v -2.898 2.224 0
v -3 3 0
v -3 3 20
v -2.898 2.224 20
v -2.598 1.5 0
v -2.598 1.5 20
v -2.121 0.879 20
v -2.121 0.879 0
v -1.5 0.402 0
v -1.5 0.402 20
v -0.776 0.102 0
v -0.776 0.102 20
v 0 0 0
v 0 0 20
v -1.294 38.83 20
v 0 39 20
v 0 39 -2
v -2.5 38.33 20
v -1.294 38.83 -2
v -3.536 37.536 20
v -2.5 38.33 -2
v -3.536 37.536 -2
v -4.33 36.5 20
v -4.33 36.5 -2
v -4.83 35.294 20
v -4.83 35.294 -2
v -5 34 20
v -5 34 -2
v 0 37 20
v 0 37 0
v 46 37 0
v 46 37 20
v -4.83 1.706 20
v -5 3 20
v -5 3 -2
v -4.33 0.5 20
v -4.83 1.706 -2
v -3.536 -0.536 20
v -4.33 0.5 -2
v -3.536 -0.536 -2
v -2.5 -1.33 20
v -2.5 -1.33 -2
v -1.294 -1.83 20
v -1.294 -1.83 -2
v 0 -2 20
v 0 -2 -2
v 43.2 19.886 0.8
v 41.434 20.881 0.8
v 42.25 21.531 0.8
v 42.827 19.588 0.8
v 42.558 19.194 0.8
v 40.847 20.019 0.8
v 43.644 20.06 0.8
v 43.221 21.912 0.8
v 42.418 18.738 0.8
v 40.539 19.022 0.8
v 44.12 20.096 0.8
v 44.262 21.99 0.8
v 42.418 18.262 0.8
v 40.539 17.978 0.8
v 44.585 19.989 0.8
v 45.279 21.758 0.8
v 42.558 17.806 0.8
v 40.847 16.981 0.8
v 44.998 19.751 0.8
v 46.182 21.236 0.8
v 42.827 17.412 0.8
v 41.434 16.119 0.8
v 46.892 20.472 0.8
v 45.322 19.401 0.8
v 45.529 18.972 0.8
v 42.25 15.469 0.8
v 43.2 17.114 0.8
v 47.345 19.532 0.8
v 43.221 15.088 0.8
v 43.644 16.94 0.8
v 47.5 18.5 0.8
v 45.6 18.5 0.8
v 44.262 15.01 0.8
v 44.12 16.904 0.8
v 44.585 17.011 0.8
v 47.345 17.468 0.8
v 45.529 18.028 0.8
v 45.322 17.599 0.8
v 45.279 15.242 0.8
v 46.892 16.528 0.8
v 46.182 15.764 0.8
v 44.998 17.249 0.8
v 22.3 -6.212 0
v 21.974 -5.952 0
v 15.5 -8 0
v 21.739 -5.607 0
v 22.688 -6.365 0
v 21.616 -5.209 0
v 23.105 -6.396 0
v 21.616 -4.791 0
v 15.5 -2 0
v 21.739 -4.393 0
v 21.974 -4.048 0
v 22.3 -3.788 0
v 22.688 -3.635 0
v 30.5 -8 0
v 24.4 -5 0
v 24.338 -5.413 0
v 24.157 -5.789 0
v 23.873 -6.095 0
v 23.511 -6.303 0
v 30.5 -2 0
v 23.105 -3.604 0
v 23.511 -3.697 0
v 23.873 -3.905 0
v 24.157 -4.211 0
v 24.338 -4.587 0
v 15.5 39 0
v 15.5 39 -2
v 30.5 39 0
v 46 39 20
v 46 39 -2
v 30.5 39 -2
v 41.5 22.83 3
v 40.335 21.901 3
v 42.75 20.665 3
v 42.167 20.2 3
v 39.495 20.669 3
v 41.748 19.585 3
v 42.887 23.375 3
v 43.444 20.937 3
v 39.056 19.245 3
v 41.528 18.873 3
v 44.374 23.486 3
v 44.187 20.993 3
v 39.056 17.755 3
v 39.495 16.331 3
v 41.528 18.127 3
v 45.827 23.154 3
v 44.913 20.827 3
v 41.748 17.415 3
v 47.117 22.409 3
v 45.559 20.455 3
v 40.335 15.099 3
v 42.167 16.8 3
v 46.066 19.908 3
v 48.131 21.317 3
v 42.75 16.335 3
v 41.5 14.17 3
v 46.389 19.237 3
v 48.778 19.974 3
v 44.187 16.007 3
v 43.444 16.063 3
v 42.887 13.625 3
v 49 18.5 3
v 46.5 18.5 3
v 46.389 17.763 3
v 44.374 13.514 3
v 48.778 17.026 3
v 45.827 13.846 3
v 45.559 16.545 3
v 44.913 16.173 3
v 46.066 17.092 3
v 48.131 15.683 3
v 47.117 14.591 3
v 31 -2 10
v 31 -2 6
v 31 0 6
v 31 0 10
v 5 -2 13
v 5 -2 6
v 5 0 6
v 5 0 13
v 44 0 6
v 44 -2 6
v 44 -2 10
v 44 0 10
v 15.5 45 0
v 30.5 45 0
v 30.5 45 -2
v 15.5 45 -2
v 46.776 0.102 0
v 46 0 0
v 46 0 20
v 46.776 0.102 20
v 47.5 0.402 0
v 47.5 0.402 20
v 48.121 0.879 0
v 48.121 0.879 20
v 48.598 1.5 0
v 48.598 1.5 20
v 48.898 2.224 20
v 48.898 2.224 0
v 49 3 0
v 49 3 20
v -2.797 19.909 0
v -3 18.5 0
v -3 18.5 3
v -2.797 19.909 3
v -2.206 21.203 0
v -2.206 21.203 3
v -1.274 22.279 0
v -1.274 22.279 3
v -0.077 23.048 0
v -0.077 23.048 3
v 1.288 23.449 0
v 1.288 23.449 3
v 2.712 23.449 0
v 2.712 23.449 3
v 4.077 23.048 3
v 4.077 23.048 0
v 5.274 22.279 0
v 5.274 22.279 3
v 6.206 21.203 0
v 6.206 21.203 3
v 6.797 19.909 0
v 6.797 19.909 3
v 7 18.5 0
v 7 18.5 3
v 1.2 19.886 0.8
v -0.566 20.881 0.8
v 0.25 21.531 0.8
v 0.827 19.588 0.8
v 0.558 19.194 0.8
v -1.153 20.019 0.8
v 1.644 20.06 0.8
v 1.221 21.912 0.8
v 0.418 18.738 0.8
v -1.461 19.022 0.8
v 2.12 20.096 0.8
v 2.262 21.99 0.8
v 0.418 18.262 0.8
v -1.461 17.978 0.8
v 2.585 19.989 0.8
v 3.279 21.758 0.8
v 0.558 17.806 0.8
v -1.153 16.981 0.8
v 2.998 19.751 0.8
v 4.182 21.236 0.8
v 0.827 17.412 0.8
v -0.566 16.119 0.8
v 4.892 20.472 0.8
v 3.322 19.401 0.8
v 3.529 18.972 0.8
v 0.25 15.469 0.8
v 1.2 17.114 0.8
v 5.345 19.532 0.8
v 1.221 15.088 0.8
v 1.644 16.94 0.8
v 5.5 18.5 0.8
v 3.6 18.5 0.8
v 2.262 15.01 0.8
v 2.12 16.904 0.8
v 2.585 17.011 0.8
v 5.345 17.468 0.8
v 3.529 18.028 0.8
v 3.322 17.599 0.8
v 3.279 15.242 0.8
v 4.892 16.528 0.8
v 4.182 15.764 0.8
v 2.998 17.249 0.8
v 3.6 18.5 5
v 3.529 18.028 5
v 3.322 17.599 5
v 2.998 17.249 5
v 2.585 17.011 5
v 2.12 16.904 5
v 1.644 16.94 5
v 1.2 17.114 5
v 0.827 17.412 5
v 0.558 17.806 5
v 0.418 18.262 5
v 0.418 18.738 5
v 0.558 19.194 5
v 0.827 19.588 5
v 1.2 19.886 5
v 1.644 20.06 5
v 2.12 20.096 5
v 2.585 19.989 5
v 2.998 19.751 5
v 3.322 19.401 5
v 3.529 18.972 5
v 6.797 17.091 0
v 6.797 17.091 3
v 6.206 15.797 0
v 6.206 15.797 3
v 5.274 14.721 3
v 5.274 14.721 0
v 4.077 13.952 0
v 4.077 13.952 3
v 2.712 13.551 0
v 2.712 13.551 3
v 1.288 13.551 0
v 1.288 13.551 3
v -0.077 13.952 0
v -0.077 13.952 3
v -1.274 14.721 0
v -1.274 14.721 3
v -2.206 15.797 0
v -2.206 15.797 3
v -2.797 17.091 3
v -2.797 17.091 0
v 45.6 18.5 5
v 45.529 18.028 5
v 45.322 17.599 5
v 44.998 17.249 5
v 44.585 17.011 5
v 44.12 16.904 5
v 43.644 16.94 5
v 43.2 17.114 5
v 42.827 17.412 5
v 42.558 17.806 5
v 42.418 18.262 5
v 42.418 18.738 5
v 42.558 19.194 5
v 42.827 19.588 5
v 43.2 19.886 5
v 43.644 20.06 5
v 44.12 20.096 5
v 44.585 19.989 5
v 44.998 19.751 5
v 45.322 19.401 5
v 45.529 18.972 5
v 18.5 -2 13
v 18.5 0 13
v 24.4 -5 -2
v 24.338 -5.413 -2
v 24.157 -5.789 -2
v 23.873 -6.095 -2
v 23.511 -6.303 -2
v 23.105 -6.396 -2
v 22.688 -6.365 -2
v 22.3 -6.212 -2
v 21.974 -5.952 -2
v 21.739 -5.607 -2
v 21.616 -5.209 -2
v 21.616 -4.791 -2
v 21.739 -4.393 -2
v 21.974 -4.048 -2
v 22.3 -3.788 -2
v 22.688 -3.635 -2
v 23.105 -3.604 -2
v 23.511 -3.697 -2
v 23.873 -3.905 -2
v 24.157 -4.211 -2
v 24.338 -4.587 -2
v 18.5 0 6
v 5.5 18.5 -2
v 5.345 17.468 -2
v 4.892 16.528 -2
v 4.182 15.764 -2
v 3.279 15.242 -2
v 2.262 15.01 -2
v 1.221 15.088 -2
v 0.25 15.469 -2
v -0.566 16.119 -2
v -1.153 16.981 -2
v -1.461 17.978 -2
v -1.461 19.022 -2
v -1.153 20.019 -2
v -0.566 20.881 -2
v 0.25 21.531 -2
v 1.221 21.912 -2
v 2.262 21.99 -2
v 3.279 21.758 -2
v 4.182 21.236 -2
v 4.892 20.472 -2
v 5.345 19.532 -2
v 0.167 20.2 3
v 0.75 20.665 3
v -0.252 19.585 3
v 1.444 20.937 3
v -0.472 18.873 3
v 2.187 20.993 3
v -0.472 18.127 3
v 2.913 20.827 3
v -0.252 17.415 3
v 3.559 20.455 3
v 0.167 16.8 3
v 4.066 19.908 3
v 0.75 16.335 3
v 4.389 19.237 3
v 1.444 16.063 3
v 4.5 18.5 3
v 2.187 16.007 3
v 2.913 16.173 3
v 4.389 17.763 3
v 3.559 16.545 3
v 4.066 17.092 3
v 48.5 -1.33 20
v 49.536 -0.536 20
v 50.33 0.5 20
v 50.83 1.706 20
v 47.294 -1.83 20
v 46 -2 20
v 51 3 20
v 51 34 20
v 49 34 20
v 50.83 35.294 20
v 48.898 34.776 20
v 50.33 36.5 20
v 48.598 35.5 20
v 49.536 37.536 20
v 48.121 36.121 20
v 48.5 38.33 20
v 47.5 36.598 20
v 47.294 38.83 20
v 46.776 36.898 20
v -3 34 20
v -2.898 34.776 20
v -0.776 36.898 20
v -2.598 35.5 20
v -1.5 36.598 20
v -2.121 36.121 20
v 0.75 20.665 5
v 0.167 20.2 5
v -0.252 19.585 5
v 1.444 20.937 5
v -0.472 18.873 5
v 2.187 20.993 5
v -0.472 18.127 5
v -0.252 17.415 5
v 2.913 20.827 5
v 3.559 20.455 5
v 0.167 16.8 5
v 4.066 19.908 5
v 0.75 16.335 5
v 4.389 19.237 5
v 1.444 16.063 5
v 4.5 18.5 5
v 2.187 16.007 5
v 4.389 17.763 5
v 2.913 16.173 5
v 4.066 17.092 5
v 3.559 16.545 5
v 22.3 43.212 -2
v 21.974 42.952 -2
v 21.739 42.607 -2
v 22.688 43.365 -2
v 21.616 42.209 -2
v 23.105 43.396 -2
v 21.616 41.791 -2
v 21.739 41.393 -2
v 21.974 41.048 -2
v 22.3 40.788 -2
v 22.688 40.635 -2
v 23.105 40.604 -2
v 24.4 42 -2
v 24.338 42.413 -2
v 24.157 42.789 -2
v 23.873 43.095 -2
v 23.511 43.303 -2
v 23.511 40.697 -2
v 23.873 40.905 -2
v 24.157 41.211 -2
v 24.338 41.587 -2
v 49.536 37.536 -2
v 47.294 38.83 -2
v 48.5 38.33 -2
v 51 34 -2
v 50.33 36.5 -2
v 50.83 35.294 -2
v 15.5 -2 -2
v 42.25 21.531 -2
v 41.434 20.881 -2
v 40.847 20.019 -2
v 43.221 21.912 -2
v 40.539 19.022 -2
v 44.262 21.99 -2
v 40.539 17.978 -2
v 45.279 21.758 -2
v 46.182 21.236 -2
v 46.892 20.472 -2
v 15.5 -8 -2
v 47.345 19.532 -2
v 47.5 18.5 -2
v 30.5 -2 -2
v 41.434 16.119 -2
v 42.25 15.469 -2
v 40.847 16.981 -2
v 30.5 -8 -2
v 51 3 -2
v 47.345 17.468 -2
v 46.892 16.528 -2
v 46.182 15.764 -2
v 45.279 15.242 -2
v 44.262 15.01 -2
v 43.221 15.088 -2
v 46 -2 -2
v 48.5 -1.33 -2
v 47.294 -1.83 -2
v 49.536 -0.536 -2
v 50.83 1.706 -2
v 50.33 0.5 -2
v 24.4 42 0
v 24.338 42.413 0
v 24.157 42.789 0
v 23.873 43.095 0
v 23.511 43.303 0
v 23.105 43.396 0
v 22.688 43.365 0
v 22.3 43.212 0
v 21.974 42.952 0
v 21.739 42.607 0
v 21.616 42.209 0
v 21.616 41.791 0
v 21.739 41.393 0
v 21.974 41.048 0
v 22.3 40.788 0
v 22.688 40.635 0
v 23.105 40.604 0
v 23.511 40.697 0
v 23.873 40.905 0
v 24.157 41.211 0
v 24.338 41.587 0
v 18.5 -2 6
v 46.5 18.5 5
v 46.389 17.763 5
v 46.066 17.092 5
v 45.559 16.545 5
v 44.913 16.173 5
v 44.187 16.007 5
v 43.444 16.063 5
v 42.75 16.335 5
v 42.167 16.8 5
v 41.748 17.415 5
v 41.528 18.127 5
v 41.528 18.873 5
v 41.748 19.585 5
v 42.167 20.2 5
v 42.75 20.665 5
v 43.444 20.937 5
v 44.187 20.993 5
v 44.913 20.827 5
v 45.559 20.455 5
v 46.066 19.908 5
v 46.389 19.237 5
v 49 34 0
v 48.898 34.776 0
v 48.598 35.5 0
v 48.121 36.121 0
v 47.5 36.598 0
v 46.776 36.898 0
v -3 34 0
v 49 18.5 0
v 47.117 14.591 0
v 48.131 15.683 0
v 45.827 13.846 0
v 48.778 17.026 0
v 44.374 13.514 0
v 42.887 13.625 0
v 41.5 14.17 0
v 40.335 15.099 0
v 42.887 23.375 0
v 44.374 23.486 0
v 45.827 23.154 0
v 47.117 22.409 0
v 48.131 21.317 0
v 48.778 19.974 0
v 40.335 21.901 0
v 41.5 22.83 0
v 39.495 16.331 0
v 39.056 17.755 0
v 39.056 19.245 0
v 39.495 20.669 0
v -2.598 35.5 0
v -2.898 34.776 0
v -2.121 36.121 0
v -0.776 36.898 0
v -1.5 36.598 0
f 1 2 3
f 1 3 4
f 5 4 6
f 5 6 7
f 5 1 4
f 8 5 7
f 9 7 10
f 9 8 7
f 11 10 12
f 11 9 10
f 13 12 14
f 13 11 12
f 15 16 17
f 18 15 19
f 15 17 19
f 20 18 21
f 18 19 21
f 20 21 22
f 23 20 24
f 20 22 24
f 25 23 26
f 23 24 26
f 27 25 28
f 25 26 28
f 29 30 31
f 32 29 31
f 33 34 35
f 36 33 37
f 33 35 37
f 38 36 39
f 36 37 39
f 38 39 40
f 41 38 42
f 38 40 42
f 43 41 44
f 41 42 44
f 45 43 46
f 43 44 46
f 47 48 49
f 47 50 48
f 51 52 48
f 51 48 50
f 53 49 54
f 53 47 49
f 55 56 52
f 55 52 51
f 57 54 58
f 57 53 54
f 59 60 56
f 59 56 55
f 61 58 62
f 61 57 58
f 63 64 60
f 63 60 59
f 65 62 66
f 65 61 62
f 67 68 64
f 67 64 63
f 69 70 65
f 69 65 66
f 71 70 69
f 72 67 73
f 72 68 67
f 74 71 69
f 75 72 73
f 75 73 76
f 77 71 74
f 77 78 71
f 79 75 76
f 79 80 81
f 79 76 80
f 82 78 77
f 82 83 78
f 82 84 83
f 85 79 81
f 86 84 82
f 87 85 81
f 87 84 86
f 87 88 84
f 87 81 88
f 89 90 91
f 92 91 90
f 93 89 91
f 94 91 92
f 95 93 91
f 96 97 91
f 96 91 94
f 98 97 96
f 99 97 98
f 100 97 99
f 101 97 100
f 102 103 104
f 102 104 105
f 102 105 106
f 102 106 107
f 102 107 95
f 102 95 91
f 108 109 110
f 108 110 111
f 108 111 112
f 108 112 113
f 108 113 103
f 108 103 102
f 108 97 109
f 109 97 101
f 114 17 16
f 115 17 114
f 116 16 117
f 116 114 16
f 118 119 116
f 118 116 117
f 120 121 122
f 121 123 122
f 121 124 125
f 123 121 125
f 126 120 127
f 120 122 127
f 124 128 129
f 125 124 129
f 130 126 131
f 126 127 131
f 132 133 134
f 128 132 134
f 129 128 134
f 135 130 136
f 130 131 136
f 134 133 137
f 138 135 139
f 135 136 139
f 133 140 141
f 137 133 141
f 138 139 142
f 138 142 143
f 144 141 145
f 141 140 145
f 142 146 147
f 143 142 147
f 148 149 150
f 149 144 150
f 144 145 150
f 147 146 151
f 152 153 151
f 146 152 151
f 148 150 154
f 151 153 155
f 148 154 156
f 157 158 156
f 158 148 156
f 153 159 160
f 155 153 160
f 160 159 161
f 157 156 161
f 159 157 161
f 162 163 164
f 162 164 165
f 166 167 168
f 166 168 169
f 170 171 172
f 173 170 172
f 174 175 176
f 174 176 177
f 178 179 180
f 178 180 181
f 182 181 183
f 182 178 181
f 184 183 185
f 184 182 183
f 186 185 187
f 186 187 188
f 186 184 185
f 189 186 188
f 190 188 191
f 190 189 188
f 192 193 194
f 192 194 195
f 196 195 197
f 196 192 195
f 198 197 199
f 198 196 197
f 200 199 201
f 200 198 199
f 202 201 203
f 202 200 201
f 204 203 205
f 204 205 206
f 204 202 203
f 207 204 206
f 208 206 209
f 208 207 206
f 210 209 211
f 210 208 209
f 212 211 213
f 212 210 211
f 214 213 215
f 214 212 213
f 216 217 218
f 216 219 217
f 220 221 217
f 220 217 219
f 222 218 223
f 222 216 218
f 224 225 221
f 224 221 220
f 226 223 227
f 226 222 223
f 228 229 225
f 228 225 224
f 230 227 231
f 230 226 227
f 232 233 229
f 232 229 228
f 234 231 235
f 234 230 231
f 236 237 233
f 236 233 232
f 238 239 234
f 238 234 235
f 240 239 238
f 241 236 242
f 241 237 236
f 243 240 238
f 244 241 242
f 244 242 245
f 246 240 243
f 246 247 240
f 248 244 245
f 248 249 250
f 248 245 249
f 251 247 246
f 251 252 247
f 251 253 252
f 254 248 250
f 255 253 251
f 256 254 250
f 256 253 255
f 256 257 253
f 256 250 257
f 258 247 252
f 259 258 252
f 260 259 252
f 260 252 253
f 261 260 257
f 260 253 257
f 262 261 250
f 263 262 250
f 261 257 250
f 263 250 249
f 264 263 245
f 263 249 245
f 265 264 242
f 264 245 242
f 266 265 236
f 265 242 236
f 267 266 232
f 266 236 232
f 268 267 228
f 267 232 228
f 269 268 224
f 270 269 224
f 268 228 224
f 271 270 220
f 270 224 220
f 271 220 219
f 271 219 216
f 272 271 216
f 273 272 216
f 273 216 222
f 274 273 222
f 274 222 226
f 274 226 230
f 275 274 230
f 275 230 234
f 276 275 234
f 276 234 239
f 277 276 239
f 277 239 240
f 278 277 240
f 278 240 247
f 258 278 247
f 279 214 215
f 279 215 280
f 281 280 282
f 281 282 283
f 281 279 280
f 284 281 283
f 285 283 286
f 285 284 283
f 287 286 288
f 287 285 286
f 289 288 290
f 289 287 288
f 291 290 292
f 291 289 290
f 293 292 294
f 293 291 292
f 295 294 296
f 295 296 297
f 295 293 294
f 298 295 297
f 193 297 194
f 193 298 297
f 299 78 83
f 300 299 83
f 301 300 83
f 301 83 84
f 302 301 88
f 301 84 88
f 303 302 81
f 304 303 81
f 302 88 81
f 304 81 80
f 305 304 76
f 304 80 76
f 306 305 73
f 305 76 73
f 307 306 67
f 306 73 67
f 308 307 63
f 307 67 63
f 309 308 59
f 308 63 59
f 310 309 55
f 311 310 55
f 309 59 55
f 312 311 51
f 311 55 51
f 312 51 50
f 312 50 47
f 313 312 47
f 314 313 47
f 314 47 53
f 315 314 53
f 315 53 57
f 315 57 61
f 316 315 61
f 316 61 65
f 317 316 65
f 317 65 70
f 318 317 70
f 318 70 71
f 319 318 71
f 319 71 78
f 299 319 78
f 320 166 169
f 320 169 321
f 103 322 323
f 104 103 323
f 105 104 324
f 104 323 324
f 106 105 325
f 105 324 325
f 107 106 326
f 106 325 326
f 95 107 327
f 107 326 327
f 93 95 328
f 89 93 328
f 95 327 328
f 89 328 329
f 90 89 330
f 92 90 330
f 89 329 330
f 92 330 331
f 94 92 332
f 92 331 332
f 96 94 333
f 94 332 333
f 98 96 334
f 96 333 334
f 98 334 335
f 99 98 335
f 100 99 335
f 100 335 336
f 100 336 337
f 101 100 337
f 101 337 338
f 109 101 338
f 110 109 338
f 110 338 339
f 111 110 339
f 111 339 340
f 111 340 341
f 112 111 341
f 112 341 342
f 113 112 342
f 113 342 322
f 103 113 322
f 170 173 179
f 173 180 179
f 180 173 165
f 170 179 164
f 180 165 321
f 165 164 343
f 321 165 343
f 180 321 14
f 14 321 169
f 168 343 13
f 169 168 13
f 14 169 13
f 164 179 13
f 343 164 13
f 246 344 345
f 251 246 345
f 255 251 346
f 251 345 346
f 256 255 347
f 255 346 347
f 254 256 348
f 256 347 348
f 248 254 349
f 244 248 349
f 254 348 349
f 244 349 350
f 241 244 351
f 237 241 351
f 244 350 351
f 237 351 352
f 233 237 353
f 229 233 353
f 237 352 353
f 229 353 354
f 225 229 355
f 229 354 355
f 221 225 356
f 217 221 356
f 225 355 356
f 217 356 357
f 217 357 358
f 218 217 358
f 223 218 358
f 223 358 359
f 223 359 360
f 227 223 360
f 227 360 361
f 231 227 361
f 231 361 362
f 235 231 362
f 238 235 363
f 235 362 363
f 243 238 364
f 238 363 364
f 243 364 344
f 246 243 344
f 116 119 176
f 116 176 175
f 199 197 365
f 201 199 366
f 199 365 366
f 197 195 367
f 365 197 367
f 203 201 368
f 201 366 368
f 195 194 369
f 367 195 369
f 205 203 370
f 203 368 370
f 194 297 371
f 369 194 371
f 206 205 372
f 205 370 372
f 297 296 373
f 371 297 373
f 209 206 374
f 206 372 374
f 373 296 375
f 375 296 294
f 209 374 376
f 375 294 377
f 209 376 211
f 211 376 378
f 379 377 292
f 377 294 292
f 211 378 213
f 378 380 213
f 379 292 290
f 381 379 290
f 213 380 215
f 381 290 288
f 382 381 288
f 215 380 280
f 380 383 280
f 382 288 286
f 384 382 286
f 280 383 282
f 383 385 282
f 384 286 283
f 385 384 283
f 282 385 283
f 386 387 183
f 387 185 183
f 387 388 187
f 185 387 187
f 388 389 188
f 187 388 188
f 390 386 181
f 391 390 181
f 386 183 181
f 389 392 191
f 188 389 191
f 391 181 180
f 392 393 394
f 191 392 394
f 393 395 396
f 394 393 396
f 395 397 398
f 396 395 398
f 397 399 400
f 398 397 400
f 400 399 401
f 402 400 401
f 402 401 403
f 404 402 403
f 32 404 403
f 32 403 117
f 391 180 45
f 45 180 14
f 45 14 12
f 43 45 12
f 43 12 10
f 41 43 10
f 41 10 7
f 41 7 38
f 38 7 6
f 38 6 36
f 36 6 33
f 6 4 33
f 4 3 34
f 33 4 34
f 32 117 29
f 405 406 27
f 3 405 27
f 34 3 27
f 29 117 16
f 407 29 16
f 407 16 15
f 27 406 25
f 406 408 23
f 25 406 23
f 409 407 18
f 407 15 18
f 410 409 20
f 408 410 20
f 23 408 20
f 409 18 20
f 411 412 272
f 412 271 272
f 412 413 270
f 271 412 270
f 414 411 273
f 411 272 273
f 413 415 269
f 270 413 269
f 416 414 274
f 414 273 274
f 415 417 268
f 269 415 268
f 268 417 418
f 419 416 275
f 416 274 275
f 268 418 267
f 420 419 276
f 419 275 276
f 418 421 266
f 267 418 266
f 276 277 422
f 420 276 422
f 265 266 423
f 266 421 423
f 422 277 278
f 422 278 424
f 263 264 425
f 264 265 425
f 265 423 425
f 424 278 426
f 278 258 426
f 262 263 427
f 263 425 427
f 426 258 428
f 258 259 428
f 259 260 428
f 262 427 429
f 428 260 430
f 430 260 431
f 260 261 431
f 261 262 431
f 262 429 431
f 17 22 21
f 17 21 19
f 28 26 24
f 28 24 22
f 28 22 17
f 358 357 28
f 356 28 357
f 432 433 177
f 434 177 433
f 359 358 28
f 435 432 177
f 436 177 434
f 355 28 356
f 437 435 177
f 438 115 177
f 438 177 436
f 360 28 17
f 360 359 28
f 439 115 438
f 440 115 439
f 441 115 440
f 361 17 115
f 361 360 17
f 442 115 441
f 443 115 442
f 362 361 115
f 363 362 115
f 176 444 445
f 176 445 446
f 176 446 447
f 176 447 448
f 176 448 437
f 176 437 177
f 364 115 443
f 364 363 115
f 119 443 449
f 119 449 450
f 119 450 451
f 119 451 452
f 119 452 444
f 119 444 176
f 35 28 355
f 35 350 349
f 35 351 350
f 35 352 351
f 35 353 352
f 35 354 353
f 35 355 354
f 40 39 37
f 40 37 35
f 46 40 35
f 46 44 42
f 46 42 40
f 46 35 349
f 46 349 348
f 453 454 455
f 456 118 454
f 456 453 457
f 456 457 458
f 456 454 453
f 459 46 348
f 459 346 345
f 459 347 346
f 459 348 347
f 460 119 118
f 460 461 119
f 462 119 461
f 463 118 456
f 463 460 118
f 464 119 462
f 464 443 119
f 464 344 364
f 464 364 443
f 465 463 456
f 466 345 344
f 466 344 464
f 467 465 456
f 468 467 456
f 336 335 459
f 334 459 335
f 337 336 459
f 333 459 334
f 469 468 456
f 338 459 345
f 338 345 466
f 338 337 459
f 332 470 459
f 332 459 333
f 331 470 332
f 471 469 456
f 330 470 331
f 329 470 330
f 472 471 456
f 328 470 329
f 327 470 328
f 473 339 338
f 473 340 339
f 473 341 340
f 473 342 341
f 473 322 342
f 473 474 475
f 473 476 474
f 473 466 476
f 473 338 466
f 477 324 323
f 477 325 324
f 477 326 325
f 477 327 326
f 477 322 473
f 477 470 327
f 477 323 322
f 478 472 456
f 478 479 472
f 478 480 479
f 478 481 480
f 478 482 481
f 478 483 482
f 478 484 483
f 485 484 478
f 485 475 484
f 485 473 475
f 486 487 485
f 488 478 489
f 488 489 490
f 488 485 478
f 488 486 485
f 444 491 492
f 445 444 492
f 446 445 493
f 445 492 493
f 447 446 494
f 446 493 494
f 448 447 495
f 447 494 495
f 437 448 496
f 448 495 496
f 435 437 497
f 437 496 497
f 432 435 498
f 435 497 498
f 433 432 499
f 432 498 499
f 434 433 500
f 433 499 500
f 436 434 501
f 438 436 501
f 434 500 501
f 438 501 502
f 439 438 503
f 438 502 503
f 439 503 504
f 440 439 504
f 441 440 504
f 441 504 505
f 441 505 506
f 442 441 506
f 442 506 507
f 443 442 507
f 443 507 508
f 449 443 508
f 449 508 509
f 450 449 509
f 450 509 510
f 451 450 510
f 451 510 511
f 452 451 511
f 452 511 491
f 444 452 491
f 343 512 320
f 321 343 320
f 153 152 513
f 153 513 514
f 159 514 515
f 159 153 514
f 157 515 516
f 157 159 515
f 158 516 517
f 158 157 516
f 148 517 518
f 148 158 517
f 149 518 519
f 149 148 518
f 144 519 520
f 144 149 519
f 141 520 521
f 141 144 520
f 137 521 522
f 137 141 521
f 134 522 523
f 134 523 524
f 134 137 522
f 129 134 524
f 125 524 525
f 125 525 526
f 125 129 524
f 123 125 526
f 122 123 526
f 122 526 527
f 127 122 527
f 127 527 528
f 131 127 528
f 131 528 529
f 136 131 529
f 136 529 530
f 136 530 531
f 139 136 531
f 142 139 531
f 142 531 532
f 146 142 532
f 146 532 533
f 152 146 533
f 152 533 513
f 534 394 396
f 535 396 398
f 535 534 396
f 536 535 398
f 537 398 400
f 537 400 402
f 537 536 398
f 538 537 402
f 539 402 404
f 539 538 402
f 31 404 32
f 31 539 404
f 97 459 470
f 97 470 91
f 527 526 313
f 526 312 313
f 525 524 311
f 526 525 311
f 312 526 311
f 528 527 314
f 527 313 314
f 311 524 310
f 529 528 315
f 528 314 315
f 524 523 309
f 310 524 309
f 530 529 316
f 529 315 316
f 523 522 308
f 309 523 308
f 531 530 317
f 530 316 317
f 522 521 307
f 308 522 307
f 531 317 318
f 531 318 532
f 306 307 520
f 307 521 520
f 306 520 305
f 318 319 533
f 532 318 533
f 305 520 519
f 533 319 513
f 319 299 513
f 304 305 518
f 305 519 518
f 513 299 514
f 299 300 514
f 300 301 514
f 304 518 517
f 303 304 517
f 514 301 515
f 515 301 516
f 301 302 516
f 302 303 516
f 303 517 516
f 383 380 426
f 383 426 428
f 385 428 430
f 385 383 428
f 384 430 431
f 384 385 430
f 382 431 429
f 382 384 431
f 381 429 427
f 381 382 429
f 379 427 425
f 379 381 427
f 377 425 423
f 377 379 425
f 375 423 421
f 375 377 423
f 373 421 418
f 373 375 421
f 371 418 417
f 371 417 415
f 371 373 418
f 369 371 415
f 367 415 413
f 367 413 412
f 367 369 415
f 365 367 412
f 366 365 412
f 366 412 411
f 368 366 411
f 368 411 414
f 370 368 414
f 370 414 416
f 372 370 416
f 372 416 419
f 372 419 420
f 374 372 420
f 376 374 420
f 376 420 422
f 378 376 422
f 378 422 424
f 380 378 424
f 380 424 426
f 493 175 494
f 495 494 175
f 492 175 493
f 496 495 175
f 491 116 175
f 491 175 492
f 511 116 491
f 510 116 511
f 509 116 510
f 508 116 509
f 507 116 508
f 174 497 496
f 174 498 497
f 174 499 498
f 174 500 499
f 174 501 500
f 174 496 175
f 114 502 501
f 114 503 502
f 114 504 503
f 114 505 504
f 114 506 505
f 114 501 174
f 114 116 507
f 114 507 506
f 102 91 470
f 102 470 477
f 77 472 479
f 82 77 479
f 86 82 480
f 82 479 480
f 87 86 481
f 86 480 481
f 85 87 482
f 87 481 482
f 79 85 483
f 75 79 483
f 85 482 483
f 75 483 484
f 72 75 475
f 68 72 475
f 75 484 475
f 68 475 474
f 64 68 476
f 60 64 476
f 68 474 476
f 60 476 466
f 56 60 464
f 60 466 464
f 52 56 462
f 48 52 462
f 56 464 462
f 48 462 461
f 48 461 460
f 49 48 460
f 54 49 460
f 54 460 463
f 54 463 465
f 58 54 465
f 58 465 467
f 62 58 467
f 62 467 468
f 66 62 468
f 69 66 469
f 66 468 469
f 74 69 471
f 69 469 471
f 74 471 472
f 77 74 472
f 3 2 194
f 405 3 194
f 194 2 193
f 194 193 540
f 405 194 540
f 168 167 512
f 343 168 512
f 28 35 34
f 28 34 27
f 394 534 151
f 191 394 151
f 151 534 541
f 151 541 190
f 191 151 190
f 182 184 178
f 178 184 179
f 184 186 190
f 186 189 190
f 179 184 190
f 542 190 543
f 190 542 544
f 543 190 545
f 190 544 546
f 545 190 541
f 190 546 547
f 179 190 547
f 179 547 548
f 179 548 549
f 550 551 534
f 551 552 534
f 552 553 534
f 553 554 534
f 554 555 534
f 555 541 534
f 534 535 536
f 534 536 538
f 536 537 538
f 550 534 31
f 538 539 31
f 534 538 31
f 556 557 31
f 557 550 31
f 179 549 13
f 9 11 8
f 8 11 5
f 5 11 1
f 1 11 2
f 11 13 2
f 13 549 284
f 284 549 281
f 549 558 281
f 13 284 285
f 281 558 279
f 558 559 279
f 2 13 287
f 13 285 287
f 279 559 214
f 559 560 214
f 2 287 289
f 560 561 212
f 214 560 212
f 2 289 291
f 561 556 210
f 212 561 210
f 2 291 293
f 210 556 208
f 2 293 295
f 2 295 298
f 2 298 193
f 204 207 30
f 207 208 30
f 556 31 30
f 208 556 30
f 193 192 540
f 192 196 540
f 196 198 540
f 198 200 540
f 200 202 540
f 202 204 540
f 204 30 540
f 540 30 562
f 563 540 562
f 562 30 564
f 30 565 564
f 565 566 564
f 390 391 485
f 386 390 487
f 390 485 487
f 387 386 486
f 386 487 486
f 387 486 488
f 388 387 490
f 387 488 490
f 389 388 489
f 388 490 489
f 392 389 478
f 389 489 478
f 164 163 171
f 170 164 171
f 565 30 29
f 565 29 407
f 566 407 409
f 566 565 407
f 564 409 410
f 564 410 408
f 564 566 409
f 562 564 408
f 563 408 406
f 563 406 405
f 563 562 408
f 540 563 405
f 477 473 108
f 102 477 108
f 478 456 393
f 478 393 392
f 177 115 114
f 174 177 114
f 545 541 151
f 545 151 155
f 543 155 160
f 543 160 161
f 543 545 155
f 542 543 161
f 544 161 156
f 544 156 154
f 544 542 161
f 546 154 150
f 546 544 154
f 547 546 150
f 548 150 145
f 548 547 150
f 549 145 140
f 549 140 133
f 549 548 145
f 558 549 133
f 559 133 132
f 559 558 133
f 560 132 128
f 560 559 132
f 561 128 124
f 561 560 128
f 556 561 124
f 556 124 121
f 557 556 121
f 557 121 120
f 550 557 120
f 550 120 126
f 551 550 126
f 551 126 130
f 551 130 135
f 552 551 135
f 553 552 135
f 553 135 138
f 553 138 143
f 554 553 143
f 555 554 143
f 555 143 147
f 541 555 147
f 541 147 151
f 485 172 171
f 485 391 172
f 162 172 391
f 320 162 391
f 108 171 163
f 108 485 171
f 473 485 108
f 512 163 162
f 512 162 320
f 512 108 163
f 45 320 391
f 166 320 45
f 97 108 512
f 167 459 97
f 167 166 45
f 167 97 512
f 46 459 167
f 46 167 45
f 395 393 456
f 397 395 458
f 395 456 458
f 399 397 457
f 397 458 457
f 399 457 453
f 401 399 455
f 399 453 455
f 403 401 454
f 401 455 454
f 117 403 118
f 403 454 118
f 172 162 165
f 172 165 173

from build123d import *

# Parameters (mm, degrees)
PAD_DEPTH       = 20
THICKNESS_T     = 2
SKETCH001_W     = 15
SKETCH001_H     = 2
PAD001_DEPTH    = 6
SKETCH002_R     = 1.4
POCKET_DEPTH    = 2.001
SKETCH003_W     = 15
SKETCH003_H     = 2
PAD002_DEPTH    = 6
SKETCH004_R     = 1.4
POCKET001_DEPTH = 22.001
SKETCH005_R     = 2.5
PAD003_DEPTH    = 7
SKETCH006_R     = 5
PAD004_DEPTH    = 5
SKETCH007_R     = 1.6
POCKET002_DEPTH = 22.001
SKETCH008_R     = 3.5
POCKET003_DEPTH = 2.8
SKETCH009_W     = 13.5
SKETCH009_H     = 7
SKETCH009_W_2   = 13
SKETCH009_H_2   = 4
POCKET004_DEPTH = 2


with BuildPart() as part:
    # Sketch → Pad (new body)
    with BuildSketch(Plane.XY):
        with BuildLine():
            Line((0, 37), (46, 37))
            ThreePointArc((49, 34), (48.1213203436, 36.1213203436), (46, 37))
            Line((49, 34), (49, 3))
            ThreePointArc((46, 0), (48.1213203436, 0.8786796564), (49, 3))
            Line((46, 0), (0, 0))
            ThreePointArc((-3, 3), (-2.1213203436, 0.8786796564), (0, 0))
            Line((-3, 3), (-3, 34))
            ThreePointArc((0, 37), (-2.1213203436, 36.1213203436), (-3, 34))
        make_face()
    extrude(amount=PAD_DEPTH)

    # Thickness
    thickness_openings = [part.faces().sort_by_distance(p)[0] for p in [
        (23, 18.5, 20),
    ]]
    offset(amount=THICKNESS_T, openings=thickness_openings, kind=Kind.INTERSECTION)

    # Sketch001 → Pad001 (new body)
    with BuildSketch(Plane(origin=(0, 39, 0), x_dir=(-1, 0, 0), z_dir=(0, 1, 0))):
        with Locations((-23, -1)):
            Rectangle(SKETCH001_W, SKETCH001_H)
    extrude(amount=PAD001_DEPTH)

    # Sketch002 → Pocket (cut, through all)
    with BuildSketch(Plane.XY):
        with Locations((23, 42)):
            Circle(SKETCH002_R)
    extrude(amount=-POCKET_DEPTH, mode=Mode.SUBTRACT)

    # Sketch003 → Pad002 (new body)
    with BuildSketch(Plane.XZ.offset(2)):
        with Locations((23, -1)):
            Rectangle(SKETCH003_W, SKETCH003_H)
    extrude(amount=PAD002_DEPTH)

    # Sketch004 → Pocket001 (cut, through all)
    with BuildSketch(Plane(origin=(0, 0, -2), x_dir=(1, 0, 0), z_dir=(0, 0, -1))):
        with Locations((23, 5)):
            Circle(SKETCH004_R)
    extrude(amount=-POCKET001_DEPTH, mode=Mode.SUBTRACT)

    # Sketch005 → Pad003 (new body)
    with BuildSketch(Plane(origin=(0, 0, -2), x_dir=(1, 0, 0), z_dir=(0, 0, -1))):
        with Locations((2, -18.5)):
            Circle(SKETCH005_R)
        with Locations((44, -18.5)):
            Circle(SKETCH005_R)
    extrude(amount=-PAD003_DEPTH)

    # Sketch006 → Pad004 (new body)
    with BuildSketch(Plane(origin=(0, 0, -2), x_dir=(1, 0, 0), z_dir=(0, 0, -1))):
        with Locations((2, -18.5)):
            Circle(SKETCH006_R)
        with Locations((44, -18.5)):
            Circle(SKETCH006_R)
    extrude(amount=-PAD004_DEPTH)

    # Sketch007 → Pocket002 (cut, through all)
    with BuildSketch(Plane(origin=(0, 0, -2), x_dir=(1, 0, 0), z_dir=(0, 0, -1))):
        with Locations((2, -18.5)):
            Circle(SKETCH007_R)
        with Locations((44, -18.5)):
            Circle(SKETCH007_R)
    extrude(amount=-POCKET002_DEPTH, mode=Mode.SUBTRACT)

    # Sketch008 → Pocket003 (cut)
    with BuildSketch(Plane(origin=(0, 0, -2), x_dir=(1, 0, 0), z_dir=(0, 0, -1))):
        with Locations((2, -18.5)):
            Circle(SKETCH008_R)
        with Locations((44, -18.5)):
            Circle(SKETCH008_R)
    extrude(amount=-POCKET003_DEPTH, mode=Mode.SUBTRACT)

    # Sketch009 → Pocket004 (cut)
    with BuildSketch(Plane.XZ.offset(2)):
        with Locations((11.75, 9.5)):
            Rectangle(SKETCH009_W, SKETCH009_H)
        with Locations((37.5, 8)):
            Rectangle(SKETCH009_W_2, SKETCH009_H_2)
    extrude(amount=-POCKET004_DEPTH, mode=Mode.SUBTRACT)


solid = part.part
